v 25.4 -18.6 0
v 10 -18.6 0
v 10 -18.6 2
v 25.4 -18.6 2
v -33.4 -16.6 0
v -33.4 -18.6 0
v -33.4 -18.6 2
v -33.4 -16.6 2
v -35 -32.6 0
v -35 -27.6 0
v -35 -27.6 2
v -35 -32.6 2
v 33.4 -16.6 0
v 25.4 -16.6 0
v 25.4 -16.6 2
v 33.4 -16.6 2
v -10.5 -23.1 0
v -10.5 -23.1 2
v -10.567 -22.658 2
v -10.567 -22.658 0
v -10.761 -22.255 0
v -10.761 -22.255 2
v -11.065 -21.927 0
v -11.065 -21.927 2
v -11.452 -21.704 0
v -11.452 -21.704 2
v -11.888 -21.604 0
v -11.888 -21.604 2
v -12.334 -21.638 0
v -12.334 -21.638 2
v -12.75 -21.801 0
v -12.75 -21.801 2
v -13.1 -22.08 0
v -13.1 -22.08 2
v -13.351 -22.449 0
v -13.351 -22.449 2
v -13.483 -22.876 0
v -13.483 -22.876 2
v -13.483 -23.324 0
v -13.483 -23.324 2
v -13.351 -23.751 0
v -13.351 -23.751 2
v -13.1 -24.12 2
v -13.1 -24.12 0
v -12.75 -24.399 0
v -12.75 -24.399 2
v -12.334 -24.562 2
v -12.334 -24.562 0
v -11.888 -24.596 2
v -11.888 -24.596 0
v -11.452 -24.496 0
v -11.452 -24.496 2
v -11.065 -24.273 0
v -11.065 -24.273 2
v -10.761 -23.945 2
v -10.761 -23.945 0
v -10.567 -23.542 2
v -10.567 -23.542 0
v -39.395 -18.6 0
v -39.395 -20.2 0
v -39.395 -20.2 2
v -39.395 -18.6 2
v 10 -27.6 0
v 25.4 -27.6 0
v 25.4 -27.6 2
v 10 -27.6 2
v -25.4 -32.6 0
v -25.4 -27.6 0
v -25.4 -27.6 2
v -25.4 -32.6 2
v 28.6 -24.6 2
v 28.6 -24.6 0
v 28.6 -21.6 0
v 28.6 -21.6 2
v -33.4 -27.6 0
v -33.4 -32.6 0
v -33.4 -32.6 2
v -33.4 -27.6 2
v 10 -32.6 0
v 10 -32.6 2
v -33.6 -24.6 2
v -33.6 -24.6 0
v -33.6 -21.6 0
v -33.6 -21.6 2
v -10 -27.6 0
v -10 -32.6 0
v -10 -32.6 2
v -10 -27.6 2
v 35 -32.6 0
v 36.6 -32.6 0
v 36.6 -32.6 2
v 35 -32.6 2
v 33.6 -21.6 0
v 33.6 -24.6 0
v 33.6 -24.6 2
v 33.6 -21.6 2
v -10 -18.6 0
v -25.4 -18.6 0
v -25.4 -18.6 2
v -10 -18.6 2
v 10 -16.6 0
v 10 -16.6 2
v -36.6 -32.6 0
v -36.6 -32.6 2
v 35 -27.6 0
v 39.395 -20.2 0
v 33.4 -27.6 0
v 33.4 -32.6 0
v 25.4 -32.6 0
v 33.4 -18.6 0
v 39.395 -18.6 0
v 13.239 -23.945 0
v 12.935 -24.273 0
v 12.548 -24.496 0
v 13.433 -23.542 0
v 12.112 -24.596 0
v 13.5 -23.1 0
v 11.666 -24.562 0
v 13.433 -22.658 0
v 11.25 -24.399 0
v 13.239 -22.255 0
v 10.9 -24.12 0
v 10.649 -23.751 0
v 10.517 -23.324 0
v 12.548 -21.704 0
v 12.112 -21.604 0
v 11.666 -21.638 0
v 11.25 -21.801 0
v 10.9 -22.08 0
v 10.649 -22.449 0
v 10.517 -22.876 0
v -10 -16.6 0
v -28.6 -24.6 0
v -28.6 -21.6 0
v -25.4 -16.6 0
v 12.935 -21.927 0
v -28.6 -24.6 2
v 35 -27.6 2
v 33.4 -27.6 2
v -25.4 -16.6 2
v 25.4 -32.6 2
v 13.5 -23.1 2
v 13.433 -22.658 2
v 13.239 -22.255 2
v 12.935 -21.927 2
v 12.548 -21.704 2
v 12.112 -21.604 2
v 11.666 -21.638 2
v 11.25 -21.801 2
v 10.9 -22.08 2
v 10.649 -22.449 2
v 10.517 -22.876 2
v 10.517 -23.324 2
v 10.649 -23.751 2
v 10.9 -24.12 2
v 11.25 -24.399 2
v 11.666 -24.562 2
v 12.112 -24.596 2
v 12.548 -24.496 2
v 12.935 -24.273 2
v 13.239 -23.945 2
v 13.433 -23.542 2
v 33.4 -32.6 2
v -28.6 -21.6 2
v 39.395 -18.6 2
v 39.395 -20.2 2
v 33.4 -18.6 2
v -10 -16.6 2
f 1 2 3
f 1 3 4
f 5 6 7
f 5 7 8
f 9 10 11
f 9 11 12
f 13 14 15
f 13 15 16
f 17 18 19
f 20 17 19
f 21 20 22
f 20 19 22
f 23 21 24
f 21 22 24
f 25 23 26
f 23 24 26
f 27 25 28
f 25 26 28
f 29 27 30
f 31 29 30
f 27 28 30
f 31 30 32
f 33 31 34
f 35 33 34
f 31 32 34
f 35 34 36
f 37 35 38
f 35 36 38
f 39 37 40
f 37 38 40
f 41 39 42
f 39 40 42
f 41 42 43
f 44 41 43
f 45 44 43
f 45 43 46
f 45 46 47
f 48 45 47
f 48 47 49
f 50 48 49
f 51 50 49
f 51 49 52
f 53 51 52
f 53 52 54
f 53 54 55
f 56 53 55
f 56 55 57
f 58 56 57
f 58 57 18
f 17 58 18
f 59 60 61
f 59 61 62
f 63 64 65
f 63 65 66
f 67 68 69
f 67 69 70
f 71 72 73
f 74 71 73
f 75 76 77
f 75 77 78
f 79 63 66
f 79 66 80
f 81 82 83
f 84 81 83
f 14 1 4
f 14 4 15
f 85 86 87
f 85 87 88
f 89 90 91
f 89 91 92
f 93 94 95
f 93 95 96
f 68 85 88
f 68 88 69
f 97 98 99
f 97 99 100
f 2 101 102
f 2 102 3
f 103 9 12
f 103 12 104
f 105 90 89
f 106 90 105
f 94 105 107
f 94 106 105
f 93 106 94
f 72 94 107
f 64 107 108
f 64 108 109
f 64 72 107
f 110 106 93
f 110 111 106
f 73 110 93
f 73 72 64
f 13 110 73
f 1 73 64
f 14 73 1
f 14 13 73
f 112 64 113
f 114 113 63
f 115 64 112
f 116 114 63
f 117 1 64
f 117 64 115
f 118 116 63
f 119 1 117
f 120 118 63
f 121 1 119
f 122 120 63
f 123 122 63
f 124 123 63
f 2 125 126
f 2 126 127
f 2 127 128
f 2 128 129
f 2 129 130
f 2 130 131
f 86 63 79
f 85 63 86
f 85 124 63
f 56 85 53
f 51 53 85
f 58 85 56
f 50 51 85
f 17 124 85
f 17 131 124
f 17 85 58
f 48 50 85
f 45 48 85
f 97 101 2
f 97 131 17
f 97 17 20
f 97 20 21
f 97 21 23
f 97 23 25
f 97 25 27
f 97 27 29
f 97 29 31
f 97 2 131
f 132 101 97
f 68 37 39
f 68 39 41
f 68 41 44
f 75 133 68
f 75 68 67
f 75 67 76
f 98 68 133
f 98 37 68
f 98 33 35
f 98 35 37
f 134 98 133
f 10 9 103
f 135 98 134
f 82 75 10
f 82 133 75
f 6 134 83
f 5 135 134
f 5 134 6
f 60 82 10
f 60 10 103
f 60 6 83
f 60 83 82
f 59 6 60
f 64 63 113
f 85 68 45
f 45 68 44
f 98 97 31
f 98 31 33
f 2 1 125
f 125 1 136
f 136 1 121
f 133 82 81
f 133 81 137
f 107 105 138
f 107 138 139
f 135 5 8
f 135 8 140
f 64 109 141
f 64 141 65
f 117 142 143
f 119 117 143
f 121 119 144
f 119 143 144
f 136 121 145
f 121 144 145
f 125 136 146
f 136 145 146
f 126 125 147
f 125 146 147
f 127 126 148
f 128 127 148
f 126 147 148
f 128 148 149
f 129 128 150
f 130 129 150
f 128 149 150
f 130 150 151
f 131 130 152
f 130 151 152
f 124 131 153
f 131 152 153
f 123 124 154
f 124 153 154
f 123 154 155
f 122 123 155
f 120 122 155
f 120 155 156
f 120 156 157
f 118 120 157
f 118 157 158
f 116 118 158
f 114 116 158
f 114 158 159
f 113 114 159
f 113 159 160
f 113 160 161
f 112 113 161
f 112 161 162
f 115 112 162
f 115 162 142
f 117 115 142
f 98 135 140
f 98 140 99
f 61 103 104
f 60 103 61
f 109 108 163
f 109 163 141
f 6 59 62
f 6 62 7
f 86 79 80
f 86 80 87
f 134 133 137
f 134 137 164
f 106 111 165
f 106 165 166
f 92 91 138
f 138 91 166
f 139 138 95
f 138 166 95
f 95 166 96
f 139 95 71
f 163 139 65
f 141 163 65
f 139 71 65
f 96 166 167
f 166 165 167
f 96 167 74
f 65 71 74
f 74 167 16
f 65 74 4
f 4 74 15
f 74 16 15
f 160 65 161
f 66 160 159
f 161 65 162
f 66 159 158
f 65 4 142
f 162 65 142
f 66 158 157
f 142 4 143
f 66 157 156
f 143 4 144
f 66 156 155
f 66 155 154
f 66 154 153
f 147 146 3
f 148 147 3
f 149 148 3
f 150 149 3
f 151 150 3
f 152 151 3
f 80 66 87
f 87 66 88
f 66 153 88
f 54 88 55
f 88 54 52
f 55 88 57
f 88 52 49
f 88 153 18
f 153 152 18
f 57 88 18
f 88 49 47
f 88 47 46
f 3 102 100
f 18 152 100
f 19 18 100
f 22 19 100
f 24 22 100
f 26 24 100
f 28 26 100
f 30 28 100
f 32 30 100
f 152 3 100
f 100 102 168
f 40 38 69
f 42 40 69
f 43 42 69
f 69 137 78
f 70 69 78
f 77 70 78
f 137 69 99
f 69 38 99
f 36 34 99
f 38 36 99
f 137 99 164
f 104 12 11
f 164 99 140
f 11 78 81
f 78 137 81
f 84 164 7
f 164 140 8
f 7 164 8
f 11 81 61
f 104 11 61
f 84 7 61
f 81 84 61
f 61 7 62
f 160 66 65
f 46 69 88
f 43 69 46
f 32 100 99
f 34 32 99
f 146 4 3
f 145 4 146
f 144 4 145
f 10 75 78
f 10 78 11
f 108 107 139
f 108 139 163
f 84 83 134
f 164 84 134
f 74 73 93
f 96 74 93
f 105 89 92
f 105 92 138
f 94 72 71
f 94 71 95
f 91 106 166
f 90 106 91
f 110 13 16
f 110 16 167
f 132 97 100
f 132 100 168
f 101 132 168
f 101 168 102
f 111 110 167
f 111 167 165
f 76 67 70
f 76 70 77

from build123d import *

# Parameters (mm, degrees)
SKETCH1_W           = 5
SKETCH1_H           = 3
BOSS_EXTRUDE1_DEPTH = 2
CUT_EXTRUDE1_REACH  = 53.173
SKETCH2_R           = 1.5


with BuildPart() as part:
    # Sketch1 → Boss-Extrude1 (new body)
    with BuildSketch(Plane.XY):
        Polygon((33.4, -27.6), (33.4, -32.6), (25.4, -32.6), (25.4, -27.6), (10, -27.6), (10, -32.6), (-10, -32.6), (-10, -27.6), (-25.4, -27.6), (-25.4, -32.6), (-33.4, -32.6), (-33.4, -27.6), (-35, -27.6), (-35, -32.6), (-36.6, -32.6), (-39.394660298, -20.2), (-39.394660298, -18.6), (-33.4, -18.6), (-33.4, -16.6), (-25.4, -16.6), (-25.4, -18.6), (-10, -18.6), (-10, -16.6), (10, -16.6), (10, -18.6), (25.4, -18.6), (25.4, -16.6), (33.4, -16.6), (33.4, -18.6), (39.394660298, -18.6), (39.394660298, -20.2), (36.6, -32.6), (35, -32.6), (35, -27.6), align=None)
        with Locations((31.1, -23.1)):
            Rectangle(SKETCH1_W, SKETCH1_H, mode=Mode.SUBTRACT)
        with Locations((-31.1, -23.1)):
            Rectangle(SKETCH1_W, SKETCH1_H, mode=Mode.SUBTRACT)
    extrude(amount=BOSS_EXTRUDE1_DEPTH)

    # Sketch2 → Cut-Extrude1 (cut, up to next)
    with BuildSketch(Plane.XY.offset(2), mode=Mode.PRIVATE) as cut_extrude1_sk1:
        with Locations((12, -23.1)):
            Circle(SKETCH2_R)
    cut_extrude1_tool1 = extrude(cut_extrude1_sk1.sketch, amount=-CUT_EXTRUDE1_REACH, mode=Mode.PRIVATE) & part.part
    # Sketch2 → Cut-Extrude1 (cut, up to next)
    with BuildSketch(Plane.XY.offset(2), mode=Mode.PRIVATE) as cut_extrude1_sk2:
        with Locations((-12, -23.1)):
            Circle(SKETCH2_R)
    cut_extrude1_tool2 = extrude(cut_extrude1_sk2.sketch, amount=-CUT_EXTRUDE1_REACH, mode=Mode.PRIVATE) & part.part
    add(cut_extrude1_tool1.solids().sort_by_distance((12, -23.1, 2))[0], mode=Mode.SUBTRACT)
    add(cut_extrude1_tool2.solids().sort_by_distance((-12, -23.1, 2))[0], mode=Mode.SUBTRACT)


solid = part.part
